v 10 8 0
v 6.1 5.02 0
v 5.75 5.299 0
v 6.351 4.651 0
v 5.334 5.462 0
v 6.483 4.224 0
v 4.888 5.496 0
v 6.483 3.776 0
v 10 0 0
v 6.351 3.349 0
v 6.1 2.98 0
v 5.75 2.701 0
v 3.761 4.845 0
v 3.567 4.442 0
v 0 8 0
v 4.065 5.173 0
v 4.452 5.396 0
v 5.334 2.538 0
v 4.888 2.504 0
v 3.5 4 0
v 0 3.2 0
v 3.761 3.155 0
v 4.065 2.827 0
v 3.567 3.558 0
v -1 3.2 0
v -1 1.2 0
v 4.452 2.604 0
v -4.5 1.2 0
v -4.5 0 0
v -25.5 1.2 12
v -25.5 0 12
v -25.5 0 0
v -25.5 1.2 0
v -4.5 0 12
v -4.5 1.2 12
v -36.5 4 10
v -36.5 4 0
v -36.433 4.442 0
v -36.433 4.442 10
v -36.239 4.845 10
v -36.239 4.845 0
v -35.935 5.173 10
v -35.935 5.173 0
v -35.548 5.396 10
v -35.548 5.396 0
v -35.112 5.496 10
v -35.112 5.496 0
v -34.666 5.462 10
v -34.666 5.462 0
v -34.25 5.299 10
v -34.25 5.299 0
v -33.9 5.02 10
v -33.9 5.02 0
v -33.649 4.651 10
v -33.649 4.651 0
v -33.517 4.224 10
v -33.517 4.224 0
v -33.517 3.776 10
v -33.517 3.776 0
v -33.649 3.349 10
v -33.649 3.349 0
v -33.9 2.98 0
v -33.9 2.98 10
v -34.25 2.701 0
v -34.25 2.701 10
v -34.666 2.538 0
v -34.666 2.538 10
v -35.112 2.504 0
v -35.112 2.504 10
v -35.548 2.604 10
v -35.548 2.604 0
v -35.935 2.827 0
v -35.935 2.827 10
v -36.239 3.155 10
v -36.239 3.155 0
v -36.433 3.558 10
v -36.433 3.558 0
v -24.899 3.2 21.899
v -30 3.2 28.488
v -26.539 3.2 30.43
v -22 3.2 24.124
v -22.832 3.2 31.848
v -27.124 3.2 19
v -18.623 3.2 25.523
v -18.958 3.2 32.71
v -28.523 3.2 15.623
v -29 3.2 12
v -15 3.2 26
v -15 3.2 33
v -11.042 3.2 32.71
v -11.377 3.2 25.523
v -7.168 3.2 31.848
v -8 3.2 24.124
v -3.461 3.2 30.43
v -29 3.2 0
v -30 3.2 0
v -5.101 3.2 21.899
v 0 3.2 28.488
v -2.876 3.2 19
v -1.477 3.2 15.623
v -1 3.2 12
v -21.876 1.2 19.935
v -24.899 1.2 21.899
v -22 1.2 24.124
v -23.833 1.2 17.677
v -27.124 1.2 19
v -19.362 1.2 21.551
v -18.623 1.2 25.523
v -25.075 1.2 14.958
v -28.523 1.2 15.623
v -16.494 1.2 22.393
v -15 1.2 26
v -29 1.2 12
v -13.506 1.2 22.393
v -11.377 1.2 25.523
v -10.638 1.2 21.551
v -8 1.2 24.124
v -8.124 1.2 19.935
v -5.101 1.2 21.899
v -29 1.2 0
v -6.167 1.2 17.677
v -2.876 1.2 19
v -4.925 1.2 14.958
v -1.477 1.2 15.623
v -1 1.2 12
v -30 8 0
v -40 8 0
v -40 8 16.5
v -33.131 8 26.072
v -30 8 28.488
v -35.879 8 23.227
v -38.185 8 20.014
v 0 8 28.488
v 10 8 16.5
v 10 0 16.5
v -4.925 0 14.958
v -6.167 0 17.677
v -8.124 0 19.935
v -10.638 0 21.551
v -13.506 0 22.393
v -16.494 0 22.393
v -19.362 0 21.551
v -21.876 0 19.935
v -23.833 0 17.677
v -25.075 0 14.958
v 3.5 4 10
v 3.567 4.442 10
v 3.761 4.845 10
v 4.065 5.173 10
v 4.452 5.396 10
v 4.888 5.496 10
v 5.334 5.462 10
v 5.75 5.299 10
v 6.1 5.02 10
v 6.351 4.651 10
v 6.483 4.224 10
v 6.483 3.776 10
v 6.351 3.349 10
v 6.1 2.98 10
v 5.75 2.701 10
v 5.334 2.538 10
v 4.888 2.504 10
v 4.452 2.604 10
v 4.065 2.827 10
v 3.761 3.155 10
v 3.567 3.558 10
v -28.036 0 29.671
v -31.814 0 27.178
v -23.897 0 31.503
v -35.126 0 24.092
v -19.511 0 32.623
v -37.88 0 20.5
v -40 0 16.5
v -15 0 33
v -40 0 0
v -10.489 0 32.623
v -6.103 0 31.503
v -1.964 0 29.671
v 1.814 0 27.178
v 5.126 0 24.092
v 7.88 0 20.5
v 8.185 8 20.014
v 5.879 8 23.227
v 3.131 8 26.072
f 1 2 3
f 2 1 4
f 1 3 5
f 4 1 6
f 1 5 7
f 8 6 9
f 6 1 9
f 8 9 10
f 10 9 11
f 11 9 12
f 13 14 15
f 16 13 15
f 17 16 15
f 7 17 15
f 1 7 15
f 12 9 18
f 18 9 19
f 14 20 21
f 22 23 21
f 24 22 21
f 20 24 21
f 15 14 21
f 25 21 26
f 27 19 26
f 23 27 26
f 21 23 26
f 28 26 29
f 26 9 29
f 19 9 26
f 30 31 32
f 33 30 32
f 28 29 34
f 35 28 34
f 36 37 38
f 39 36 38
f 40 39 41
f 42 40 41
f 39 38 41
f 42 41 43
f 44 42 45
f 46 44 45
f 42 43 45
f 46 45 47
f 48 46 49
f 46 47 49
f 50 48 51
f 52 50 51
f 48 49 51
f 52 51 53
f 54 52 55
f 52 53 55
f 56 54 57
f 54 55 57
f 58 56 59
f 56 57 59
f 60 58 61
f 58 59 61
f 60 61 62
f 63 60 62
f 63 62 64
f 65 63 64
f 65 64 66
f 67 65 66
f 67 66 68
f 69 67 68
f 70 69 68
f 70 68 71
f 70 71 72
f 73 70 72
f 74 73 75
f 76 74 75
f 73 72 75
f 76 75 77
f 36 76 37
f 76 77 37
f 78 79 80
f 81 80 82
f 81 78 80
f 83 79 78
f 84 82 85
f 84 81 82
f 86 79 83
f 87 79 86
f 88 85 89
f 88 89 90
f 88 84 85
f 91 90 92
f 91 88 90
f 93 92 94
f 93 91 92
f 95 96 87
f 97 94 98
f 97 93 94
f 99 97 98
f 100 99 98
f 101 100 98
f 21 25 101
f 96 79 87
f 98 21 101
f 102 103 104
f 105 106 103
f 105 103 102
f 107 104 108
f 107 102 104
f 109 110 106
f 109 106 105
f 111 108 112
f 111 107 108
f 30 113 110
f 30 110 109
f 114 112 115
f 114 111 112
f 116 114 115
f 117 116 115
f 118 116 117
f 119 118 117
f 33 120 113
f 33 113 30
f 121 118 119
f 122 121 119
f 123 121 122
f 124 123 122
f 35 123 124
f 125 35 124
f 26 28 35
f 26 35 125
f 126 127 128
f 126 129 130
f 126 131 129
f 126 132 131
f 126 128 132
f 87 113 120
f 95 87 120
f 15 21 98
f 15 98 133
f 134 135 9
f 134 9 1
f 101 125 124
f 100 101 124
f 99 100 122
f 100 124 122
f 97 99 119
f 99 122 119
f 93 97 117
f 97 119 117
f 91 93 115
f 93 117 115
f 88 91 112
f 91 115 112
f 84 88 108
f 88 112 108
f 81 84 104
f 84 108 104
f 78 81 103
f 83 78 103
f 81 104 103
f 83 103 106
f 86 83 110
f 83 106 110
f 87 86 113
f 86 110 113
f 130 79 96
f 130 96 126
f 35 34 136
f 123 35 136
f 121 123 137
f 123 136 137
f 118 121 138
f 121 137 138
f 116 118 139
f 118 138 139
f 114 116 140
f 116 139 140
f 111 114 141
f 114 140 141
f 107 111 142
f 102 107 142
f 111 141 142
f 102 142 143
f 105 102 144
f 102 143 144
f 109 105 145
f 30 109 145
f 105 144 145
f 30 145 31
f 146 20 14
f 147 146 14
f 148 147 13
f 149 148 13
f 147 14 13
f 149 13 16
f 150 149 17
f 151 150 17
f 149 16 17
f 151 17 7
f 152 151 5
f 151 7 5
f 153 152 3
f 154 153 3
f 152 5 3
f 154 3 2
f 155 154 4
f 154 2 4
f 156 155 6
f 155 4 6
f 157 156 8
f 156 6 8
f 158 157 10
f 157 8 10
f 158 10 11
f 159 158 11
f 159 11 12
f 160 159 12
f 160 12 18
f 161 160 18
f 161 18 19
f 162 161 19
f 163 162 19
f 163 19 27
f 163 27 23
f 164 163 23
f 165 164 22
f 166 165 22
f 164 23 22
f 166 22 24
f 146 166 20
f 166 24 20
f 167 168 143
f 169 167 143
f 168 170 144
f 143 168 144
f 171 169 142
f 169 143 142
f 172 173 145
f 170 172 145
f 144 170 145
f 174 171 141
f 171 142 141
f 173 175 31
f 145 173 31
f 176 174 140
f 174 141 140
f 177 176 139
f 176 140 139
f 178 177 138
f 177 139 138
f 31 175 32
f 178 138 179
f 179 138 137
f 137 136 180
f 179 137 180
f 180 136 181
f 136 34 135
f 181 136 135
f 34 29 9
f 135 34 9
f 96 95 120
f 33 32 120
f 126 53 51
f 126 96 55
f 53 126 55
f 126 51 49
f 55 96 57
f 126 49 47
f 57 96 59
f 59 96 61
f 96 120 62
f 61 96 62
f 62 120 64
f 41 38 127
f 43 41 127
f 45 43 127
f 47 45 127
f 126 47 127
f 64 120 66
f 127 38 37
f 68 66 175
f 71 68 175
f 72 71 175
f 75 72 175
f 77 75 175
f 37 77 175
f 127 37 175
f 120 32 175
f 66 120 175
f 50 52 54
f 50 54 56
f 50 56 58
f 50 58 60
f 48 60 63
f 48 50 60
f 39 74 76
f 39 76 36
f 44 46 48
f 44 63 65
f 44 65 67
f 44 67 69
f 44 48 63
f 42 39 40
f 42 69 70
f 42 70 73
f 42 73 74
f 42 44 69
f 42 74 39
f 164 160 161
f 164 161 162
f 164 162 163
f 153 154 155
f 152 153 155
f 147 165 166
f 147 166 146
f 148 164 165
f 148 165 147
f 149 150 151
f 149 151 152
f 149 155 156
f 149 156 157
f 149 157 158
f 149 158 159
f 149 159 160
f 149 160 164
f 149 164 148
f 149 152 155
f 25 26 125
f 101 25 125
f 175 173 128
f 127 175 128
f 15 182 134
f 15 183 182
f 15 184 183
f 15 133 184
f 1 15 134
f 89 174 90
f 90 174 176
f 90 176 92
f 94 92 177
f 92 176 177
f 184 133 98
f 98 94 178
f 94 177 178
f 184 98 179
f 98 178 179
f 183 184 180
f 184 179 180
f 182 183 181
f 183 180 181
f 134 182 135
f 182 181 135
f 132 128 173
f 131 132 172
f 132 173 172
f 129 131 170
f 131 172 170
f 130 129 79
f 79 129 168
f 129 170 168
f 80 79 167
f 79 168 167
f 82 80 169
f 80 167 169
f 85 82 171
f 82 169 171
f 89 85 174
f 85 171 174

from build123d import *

# Parameters (mm, degrees)
ESQUISSE1_W             = 10
ESQUISSE1_H             = 8
ESQUISSE1_W_2           = 30
ESQUISSE1_H_2           = 1.2
BOSS_EXTRU_1_DEPTH      = 33
ENL_V_MAT_EXTRU_3_DEPTH = 30
BOSS_EXTRU_2_DEPTH      = 2
ESQUISSE4_R             = 1.5
ENL_V_MAT_EXTRU_4_DEPTH = 10
ENL_V_MAT_EXTRU_5_DEPTH = 53.469038489


with BuildPart() as part:
    # Esquisse1 → Boss.-Extru.1 (new body)
    with BuildSketch(Plane.XY):
        with Locations((-35, 4)):
            Rectangle(ESQUISSE1_W, ESQUISSE1_H)
        with Locations((5, 4)):
            Rectangle(ESQUISSE1_W, ESQUISSE1_H)
        with Locations((-15, 0.6)):
            Rectangle(ESQUISSE1_W_2, ESQUISSE1_H_2)
    extrude(amount=BOSS_EXTRU_1_DEPTH)

    # Esquisse2 → Enlèv. mat.-Extru.3 (cut)
    with BuildSketch(Plane.XZ):
        with BuildLine():
            Line((-4.5, 0), (-4.5, 12))
            ThreePointArc((-4.5, 12), (-15, 22.5), (-25.5, 12))
            Line((-25.5, 12), (-25.5, 0))
            Line((-25.5, 0), (-4.5, 0))
        make_face()
    extrude(amount=-ENL_V_MAT_EXTRU_3_DEPTH, mode=Mode.SUBTRACT)

    # Esquisse3 → Boss.-Extru.2 (add)
    with BuildSketch(Plane(origin=(0, 1.2, 0), x_dir=(1, 0, 0), z_dir=(0, 1, 0))):
        with BuildLine():
            ThreePointArc((-1, -12), (-15, -26), (-29, -12))
            Line((-29, -12), (-29, 0))
            Line((-29, 0), (-30, 0))
            Line((-30, 0), (-30, -33))
            Line((-30, -33), (0, -33))
            Line((0, -33), (0, 0))
            Line((0, 0), (-1, 0))
            Line((-1, 0), (-1, -12))
        make_face()
    extrude(amount=BOSS_EXTRU_2_DEPTH)

    # Esquisse4 → Enlèv. mat.-Extru.4 (cut)
    with BuildSketch(Plane(origin=(0, 0, 0), x_dir=(-1, 0, 0), z_dir=(0, 0, -1))):
        with Locations((35, 4)):
            Circle(ESQUISSE4_R)
        with Locations((-5, 4)):
            Circle(ESQUISSE4_R)
    extrude(amount=-ENL_V_MAT_EXTRU_4_DEPTH, mode=Mode.SUBTRACT)

    # Esquisse5 → Enlèv. mat.-Extru.5 (cut, through all)
    with BuildSketch(Plane.XZ):
        with BuildLine():
            Line((-40, 33), (-40, 16.5))
            ThreePointArc((-40, 16.5), (-29.977065819, 28.503129989), (-15.000000044, 33))
            Line((-15.000000044, 33), (-40, 33))
        make_face()
        with BuildLine():
            Line((10, 33), (-15.000000044, 33))
            ThreePointArc((-15.000000044, 33), (-0.022934218, 28.503130013), (10, 16.5))
            Line((10, 16.5), (10, 33))
        make_face()
    extrude(amount=-ENL_V_MAT_EXTRU_5_DEPTH, mode=Mode.SUBTRACT)


solid = part.part
